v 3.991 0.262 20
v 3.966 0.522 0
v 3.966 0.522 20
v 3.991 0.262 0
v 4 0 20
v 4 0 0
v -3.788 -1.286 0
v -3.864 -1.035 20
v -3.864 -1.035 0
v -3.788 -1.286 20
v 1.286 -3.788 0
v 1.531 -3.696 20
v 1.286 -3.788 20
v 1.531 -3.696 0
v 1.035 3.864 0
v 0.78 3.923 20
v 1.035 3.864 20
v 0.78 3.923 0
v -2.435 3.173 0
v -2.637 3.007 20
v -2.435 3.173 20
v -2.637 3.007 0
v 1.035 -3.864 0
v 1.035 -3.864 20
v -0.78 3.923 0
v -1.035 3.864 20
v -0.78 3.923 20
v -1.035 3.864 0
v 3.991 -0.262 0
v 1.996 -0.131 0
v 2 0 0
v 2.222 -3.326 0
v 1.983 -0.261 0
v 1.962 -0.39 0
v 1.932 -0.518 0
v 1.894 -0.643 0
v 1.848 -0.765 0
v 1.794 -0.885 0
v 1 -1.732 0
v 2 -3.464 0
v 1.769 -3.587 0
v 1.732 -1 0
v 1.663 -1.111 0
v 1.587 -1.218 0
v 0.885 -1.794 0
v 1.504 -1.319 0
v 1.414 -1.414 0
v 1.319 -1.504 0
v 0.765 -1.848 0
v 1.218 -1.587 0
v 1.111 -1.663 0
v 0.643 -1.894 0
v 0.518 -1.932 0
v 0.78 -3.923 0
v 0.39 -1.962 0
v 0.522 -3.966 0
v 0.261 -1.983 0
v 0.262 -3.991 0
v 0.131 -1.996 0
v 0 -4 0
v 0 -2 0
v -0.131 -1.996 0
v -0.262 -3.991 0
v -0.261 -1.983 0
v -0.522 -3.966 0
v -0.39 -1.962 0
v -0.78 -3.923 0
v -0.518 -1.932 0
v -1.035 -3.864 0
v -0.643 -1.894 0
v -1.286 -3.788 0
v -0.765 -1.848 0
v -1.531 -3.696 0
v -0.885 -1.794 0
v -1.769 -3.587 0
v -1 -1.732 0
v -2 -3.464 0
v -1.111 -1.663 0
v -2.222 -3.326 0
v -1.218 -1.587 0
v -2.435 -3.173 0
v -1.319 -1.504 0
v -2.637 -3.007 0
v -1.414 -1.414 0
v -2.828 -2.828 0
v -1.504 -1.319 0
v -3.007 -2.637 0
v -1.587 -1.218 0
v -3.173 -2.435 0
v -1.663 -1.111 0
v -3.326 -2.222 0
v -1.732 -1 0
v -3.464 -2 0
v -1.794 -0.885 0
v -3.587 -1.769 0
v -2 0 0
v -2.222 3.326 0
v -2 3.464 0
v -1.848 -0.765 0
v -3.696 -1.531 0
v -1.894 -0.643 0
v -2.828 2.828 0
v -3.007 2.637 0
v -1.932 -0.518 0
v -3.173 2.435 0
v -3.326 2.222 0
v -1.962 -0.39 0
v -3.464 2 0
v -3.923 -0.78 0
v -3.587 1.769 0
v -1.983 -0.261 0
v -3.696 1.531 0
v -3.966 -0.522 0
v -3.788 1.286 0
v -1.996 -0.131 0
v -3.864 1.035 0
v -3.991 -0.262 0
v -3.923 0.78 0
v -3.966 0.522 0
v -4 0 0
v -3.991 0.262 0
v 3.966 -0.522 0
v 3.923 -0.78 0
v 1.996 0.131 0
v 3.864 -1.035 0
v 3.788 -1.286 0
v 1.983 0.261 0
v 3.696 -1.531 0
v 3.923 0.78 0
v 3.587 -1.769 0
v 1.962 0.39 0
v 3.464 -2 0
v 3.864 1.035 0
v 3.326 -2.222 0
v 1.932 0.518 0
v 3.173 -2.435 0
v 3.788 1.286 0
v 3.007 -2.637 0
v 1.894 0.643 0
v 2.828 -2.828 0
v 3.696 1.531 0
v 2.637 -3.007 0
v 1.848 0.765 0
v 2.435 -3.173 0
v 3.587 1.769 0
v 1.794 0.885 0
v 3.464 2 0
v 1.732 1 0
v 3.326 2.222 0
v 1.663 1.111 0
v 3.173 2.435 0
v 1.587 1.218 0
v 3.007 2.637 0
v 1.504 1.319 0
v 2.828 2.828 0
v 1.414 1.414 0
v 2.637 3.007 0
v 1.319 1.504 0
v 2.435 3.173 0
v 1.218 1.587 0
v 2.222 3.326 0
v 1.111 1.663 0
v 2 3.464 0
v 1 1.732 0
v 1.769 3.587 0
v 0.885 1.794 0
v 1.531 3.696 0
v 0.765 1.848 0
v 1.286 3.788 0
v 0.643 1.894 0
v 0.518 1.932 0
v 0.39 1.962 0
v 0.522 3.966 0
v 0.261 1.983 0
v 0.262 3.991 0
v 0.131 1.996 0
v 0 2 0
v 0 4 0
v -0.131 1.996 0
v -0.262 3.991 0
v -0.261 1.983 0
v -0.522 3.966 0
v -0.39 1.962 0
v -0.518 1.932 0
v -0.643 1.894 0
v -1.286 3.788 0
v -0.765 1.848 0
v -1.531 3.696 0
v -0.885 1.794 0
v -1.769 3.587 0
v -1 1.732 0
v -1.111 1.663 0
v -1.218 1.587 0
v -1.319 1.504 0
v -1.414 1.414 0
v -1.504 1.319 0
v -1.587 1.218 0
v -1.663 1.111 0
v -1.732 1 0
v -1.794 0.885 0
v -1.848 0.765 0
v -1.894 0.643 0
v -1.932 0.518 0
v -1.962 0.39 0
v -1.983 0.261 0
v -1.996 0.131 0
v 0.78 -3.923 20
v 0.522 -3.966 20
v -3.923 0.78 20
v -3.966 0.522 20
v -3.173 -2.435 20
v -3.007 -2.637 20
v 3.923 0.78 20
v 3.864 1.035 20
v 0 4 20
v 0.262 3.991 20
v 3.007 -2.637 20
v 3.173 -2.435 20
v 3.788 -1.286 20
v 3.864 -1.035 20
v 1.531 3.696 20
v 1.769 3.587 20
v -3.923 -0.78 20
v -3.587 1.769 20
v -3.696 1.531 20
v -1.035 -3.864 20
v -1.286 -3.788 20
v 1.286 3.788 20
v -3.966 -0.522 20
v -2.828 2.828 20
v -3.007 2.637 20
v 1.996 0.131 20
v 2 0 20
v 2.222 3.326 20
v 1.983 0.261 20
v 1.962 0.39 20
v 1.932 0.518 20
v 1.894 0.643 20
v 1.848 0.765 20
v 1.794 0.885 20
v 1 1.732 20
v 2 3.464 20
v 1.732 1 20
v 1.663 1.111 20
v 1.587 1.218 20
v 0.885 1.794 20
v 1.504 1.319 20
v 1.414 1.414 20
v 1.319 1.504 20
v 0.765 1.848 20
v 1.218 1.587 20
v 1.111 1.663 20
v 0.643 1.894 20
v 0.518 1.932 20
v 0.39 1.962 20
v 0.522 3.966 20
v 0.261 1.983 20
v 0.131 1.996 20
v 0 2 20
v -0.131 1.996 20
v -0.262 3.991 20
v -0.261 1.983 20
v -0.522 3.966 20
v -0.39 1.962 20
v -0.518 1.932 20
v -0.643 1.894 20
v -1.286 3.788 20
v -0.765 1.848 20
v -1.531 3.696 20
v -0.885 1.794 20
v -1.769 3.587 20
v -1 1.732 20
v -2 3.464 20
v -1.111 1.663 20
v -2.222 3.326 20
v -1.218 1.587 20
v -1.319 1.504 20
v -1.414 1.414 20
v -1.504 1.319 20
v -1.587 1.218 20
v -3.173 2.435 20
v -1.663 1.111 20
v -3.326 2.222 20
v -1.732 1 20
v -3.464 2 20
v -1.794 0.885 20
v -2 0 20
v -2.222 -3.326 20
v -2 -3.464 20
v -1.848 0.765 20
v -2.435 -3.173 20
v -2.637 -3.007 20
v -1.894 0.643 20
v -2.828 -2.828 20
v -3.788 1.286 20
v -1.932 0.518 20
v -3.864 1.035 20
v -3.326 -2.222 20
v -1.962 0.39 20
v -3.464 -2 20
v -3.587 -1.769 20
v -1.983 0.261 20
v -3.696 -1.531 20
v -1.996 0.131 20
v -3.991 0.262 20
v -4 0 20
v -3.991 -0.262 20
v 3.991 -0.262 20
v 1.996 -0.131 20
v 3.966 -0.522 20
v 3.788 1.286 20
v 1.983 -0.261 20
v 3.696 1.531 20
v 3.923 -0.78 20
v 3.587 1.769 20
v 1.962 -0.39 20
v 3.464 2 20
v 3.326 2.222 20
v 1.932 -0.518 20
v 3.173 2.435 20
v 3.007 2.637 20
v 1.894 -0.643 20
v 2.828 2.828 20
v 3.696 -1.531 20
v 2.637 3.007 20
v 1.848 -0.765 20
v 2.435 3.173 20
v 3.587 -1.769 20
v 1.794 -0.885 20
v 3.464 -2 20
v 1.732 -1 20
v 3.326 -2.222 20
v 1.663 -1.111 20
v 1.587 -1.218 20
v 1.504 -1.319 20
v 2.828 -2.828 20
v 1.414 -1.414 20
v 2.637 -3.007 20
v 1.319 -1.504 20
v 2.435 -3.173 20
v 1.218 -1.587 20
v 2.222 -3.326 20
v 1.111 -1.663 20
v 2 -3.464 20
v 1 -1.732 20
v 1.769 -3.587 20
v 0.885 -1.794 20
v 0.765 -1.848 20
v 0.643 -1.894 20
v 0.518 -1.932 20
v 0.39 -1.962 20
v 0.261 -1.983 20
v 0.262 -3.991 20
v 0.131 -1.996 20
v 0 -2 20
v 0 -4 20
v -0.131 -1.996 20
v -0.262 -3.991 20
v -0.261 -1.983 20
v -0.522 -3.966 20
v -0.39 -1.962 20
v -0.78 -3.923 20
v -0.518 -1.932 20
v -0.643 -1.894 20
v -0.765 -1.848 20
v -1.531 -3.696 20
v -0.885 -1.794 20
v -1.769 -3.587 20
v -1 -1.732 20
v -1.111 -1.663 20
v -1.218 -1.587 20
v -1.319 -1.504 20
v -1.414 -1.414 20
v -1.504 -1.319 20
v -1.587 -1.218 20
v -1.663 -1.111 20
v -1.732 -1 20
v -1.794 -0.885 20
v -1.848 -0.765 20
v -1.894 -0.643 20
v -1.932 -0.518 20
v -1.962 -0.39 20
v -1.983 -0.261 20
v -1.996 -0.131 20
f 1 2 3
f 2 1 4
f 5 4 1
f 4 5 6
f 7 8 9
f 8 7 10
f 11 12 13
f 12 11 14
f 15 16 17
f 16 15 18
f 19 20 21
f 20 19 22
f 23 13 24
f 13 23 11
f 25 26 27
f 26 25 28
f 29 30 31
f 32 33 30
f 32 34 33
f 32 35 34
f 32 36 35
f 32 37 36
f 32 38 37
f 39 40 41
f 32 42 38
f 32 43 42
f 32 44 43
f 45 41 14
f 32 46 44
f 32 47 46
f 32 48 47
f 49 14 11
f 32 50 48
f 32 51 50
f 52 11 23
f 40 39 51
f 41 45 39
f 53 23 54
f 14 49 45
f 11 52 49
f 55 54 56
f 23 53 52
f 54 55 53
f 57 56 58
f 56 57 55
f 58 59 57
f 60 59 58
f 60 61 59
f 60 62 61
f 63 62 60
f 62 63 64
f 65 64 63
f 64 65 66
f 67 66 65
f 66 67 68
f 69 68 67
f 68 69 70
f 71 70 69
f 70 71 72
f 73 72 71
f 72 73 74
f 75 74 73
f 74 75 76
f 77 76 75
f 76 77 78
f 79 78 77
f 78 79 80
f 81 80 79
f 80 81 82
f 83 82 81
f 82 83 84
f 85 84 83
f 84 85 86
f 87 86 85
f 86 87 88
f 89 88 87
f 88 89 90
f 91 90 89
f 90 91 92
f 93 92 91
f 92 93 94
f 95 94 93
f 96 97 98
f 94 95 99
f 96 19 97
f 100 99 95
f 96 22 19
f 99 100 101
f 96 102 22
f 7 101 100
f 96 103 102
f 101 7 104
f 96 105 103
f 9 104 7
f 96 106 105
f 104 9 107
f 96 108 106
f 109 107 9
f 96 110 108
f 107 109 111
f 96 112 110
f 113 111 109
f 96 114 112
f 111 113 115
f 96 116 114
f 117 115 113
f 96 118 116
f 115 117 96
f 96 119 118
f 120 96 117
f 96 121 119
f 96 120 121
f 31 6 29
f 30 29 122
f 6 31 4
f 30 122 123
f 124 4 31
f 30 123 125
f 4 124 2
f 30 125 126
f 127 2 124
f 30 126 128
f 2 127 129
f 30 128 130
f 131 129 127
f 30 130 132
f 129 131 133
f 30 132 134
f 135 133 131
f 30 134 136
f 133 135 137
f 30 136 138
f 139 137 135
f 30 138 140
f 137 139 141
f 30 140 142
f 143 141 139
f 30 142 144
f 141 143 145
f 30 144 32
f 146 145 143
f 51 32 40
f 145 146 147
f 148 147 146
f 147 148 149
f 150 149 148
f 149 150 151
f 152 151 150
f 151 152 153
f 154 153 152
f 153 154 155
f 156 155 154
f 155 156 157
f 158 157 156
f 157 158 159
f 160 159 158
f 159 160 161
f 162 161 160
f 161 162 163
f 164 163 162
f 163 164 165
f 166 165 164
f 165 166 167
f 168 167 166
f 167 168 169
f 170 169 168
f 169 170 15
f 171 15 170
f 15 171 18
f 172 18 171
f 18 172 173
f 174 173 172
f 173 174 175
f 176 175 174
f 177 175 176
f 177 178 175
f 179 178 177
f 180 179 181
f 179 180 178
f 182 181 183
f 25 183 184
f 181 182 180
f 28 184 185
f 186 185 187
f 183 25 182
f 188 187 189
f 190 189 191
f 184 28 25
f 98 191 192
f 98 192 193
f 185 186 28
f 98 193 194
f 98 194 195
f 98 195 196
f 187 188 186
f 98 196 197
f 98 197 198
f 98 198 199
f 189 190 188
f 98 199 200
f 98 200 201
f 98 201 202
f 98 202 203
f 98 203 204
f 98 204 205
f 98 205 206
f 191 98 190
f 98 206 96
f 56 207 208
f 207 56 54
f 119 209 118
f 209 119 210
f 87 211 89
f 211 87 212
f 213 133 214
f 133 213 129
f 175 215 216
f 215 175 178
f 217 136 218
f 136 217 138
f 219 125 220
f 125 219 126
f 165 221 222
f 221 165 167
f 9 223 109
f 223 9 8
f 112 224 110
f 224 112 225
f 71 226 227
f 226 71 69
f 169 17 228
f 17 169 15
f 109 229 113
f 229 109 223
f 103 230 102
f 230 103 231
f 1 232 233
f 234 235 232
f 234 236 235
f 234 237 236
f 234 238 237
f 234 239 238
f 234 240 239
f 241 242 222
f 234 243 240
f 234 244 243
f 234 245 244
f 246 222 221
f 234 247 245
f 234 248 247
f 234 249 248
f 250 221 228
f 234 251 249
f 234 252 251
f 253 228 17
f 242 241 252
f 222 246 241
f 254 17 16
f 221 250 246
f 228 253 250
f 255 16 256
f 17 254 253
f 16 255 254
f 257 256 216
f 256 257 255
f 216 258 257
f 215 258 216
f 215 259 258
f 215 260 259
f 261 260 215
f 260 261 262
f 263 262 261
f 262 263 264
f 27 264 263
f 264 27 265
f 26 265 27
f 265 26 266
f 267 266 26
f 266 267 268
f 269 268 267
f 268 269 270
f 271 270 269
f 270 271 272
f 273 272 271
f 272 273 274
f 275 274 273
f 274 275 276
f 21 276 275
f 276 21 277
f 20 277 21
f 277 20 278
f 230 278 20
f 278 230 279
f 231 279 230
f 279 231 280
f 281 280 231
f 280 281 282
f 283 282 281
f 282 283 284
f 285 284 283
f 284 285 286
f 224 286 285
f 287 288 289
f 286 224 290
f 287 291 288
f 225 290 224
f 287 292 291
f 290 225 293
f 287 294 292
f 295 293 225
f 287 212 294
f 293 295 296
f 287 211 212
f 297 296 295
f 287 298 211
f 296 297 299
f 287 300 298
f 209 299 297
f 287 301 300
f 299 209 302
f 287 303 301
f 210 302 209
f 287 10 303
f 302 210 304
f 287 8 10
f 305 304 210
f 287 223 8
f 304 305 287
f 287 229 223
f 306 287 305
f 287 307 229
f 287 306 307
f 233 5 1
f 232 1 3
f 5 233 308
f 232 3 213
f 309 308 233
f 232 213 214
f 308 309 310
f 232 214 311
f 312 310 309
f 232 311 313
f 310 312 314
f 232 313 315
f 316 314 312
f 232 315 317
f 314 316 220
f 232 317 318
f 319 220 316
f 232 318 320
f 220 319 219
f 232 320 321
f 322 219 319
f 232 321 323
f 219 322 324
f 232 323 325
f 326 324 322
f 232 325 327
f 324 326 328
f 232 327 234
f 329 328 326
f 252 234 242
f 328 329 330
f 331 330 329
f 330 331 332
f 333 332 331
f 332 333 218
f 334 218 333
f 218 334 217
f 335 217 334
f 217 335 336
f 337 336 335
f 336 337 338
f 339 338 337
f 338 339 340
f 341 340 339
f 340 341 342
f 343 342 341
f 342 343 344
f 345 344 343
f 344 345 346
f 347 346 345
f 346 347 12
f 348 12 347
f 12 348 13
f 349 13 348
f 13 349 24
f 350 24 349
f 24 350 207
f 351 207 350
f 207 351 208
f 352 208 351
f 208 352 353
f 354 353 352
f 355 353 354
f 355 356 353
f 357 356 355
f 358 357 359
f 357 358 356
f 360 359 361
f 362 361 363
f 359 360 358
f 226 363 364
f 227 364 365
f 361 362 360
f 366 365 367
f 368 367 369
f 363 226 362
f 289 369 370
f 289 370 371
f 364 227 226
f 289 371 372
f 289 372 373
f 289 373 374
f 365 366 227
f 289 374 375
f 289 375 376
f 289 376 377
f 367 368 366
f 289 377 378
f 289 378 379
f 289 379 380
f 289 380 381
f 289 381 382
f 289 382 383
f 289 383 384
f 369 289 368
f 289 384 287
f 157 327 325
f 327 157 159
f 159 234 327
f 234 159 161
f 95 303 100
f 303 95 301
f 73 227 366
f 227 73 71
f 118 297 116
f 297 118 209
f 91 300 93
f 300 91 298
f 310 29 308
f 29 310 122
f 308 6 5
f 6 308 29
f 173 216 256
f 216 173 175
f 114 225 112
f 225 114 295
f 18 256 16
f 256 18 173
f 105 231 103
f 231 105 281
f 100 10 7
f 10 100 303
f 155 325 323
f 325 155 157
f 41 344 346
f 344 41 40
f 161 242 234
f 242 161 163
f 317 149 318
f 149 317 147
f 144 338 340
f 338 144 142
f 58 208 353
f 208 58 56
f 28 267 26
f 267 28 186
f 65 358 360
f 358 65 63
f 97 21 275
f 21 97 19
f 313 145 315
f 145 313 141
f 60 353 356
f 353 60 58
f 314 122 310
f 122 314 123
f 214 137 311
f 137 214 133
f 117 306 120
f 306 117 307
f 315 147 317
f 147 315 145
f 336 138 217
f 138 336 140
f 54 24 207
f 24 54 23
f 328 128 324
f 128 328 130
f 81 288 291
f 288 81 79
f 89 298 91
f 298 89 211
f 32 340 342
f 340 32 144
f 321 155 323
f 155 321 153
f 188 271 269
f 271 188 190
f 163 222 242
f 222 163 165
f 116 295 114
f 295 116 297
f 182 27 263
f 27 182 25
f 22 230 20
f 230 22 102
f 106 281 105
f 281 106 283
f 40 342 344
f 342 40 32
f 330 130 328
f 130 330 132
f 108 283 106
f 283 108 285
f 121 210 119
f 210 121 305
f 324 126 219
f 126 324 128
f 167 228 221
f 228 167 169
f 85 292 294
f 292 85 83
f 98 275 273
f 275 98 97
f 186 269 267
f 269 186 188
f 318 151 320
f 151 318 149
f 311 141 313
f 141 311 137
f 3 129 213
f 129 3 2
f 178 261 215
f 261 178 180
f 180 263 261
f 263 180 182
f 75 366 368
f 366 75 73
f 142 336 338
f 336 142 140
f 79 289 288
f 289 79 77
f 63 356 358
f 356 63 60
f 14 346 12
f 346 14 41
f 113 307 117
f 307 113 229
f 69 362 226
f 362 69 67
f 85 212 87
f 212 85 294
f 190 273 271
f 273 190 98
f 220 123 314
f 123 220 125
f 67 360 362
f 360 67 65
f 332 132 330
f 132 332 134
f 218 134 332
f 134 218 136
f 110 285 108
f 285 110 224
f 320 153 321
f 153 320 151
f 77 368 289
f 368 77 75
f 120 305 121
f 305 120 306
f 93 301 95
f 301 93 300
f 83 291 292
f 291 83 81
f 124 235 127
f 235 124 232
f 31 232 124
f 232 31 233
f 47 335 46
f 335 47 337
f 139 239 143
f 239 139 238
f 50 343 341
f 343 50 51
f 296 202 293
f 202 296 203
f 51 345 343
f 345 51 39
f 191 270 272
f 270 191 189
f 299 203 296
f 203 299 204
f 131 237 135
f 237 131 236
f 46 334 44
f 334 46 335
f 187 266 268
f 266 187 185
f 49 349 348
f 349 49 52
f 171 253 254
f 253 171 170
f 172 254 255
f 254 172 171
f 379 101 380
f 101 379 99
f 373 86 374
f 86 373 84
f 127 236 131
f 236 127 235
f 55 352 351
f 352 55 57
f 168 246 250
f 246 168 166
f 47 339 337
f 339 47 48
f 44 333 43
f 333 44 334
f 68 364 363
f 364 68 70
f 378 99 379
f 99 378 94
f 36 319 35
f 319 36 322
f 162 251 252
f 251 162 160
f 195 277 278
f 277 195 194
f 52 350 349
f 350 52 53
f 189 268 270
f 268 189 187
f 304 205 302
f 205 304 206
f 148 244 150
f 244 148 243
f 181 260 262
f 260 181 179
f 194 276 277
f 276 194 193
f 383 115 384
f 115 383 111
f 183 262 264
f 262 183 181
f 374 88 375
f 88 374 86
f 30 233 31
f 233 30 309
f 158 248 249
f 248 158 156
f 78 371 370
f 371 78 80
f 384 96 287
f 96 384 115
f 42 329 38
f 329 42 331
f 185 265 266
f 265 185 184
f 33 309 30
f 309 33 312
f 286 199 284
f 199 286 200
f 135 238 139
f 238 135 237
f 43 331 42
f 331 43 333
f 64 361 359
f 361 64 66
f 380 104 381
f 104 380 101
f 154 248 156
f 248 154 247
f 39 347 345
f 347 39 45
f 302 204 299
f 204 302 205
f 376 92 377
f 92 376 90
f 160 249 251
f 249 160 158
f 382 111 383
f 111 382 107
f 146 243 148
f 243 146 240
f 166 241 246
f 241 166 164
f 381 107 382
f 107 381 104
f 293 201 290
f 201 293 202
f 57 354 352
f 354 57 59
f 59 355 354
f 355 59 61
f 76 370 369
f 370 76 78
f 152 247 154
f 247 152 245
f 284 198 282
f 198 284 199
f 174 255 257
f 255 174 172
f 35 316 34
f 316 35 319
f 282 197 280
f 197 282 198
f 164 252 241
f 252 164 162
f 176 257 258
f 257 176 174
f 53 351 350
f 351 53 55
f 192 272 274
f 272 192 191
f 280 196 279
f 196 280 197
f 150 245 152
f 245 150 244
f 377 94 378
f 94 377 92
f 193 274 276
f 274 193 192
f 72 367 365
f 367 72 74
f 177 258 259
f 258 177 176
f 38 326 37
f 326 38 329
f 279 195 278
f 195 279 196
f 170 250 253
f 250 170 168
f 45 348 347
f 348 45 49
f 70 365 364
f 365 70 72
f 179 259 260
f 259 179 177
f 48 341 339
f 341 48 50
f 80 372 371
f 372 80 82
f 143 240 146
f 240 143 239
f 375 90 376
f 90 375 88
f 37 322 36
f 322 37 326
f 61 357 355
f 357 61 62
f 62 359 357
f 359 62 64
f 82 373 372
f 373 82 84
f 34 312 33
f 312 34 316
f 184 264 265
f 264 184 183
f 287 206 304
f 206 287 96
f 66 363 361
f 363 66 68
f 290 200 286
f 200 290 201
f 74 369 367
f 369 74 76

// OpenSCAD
$fn = 96;

thread_d = 4.0;      // nominal thread diameter (mm)
length   = 20.0;     // overall length (mm)
outer_d  = 8.0;      // standoff outer diameter (mm)

difference() {
  cylinder(d = outer_d, h = length);
  translate([0, 0, -0.2])
    cylinder(d = thread_d, h = length + 0.4);
}
